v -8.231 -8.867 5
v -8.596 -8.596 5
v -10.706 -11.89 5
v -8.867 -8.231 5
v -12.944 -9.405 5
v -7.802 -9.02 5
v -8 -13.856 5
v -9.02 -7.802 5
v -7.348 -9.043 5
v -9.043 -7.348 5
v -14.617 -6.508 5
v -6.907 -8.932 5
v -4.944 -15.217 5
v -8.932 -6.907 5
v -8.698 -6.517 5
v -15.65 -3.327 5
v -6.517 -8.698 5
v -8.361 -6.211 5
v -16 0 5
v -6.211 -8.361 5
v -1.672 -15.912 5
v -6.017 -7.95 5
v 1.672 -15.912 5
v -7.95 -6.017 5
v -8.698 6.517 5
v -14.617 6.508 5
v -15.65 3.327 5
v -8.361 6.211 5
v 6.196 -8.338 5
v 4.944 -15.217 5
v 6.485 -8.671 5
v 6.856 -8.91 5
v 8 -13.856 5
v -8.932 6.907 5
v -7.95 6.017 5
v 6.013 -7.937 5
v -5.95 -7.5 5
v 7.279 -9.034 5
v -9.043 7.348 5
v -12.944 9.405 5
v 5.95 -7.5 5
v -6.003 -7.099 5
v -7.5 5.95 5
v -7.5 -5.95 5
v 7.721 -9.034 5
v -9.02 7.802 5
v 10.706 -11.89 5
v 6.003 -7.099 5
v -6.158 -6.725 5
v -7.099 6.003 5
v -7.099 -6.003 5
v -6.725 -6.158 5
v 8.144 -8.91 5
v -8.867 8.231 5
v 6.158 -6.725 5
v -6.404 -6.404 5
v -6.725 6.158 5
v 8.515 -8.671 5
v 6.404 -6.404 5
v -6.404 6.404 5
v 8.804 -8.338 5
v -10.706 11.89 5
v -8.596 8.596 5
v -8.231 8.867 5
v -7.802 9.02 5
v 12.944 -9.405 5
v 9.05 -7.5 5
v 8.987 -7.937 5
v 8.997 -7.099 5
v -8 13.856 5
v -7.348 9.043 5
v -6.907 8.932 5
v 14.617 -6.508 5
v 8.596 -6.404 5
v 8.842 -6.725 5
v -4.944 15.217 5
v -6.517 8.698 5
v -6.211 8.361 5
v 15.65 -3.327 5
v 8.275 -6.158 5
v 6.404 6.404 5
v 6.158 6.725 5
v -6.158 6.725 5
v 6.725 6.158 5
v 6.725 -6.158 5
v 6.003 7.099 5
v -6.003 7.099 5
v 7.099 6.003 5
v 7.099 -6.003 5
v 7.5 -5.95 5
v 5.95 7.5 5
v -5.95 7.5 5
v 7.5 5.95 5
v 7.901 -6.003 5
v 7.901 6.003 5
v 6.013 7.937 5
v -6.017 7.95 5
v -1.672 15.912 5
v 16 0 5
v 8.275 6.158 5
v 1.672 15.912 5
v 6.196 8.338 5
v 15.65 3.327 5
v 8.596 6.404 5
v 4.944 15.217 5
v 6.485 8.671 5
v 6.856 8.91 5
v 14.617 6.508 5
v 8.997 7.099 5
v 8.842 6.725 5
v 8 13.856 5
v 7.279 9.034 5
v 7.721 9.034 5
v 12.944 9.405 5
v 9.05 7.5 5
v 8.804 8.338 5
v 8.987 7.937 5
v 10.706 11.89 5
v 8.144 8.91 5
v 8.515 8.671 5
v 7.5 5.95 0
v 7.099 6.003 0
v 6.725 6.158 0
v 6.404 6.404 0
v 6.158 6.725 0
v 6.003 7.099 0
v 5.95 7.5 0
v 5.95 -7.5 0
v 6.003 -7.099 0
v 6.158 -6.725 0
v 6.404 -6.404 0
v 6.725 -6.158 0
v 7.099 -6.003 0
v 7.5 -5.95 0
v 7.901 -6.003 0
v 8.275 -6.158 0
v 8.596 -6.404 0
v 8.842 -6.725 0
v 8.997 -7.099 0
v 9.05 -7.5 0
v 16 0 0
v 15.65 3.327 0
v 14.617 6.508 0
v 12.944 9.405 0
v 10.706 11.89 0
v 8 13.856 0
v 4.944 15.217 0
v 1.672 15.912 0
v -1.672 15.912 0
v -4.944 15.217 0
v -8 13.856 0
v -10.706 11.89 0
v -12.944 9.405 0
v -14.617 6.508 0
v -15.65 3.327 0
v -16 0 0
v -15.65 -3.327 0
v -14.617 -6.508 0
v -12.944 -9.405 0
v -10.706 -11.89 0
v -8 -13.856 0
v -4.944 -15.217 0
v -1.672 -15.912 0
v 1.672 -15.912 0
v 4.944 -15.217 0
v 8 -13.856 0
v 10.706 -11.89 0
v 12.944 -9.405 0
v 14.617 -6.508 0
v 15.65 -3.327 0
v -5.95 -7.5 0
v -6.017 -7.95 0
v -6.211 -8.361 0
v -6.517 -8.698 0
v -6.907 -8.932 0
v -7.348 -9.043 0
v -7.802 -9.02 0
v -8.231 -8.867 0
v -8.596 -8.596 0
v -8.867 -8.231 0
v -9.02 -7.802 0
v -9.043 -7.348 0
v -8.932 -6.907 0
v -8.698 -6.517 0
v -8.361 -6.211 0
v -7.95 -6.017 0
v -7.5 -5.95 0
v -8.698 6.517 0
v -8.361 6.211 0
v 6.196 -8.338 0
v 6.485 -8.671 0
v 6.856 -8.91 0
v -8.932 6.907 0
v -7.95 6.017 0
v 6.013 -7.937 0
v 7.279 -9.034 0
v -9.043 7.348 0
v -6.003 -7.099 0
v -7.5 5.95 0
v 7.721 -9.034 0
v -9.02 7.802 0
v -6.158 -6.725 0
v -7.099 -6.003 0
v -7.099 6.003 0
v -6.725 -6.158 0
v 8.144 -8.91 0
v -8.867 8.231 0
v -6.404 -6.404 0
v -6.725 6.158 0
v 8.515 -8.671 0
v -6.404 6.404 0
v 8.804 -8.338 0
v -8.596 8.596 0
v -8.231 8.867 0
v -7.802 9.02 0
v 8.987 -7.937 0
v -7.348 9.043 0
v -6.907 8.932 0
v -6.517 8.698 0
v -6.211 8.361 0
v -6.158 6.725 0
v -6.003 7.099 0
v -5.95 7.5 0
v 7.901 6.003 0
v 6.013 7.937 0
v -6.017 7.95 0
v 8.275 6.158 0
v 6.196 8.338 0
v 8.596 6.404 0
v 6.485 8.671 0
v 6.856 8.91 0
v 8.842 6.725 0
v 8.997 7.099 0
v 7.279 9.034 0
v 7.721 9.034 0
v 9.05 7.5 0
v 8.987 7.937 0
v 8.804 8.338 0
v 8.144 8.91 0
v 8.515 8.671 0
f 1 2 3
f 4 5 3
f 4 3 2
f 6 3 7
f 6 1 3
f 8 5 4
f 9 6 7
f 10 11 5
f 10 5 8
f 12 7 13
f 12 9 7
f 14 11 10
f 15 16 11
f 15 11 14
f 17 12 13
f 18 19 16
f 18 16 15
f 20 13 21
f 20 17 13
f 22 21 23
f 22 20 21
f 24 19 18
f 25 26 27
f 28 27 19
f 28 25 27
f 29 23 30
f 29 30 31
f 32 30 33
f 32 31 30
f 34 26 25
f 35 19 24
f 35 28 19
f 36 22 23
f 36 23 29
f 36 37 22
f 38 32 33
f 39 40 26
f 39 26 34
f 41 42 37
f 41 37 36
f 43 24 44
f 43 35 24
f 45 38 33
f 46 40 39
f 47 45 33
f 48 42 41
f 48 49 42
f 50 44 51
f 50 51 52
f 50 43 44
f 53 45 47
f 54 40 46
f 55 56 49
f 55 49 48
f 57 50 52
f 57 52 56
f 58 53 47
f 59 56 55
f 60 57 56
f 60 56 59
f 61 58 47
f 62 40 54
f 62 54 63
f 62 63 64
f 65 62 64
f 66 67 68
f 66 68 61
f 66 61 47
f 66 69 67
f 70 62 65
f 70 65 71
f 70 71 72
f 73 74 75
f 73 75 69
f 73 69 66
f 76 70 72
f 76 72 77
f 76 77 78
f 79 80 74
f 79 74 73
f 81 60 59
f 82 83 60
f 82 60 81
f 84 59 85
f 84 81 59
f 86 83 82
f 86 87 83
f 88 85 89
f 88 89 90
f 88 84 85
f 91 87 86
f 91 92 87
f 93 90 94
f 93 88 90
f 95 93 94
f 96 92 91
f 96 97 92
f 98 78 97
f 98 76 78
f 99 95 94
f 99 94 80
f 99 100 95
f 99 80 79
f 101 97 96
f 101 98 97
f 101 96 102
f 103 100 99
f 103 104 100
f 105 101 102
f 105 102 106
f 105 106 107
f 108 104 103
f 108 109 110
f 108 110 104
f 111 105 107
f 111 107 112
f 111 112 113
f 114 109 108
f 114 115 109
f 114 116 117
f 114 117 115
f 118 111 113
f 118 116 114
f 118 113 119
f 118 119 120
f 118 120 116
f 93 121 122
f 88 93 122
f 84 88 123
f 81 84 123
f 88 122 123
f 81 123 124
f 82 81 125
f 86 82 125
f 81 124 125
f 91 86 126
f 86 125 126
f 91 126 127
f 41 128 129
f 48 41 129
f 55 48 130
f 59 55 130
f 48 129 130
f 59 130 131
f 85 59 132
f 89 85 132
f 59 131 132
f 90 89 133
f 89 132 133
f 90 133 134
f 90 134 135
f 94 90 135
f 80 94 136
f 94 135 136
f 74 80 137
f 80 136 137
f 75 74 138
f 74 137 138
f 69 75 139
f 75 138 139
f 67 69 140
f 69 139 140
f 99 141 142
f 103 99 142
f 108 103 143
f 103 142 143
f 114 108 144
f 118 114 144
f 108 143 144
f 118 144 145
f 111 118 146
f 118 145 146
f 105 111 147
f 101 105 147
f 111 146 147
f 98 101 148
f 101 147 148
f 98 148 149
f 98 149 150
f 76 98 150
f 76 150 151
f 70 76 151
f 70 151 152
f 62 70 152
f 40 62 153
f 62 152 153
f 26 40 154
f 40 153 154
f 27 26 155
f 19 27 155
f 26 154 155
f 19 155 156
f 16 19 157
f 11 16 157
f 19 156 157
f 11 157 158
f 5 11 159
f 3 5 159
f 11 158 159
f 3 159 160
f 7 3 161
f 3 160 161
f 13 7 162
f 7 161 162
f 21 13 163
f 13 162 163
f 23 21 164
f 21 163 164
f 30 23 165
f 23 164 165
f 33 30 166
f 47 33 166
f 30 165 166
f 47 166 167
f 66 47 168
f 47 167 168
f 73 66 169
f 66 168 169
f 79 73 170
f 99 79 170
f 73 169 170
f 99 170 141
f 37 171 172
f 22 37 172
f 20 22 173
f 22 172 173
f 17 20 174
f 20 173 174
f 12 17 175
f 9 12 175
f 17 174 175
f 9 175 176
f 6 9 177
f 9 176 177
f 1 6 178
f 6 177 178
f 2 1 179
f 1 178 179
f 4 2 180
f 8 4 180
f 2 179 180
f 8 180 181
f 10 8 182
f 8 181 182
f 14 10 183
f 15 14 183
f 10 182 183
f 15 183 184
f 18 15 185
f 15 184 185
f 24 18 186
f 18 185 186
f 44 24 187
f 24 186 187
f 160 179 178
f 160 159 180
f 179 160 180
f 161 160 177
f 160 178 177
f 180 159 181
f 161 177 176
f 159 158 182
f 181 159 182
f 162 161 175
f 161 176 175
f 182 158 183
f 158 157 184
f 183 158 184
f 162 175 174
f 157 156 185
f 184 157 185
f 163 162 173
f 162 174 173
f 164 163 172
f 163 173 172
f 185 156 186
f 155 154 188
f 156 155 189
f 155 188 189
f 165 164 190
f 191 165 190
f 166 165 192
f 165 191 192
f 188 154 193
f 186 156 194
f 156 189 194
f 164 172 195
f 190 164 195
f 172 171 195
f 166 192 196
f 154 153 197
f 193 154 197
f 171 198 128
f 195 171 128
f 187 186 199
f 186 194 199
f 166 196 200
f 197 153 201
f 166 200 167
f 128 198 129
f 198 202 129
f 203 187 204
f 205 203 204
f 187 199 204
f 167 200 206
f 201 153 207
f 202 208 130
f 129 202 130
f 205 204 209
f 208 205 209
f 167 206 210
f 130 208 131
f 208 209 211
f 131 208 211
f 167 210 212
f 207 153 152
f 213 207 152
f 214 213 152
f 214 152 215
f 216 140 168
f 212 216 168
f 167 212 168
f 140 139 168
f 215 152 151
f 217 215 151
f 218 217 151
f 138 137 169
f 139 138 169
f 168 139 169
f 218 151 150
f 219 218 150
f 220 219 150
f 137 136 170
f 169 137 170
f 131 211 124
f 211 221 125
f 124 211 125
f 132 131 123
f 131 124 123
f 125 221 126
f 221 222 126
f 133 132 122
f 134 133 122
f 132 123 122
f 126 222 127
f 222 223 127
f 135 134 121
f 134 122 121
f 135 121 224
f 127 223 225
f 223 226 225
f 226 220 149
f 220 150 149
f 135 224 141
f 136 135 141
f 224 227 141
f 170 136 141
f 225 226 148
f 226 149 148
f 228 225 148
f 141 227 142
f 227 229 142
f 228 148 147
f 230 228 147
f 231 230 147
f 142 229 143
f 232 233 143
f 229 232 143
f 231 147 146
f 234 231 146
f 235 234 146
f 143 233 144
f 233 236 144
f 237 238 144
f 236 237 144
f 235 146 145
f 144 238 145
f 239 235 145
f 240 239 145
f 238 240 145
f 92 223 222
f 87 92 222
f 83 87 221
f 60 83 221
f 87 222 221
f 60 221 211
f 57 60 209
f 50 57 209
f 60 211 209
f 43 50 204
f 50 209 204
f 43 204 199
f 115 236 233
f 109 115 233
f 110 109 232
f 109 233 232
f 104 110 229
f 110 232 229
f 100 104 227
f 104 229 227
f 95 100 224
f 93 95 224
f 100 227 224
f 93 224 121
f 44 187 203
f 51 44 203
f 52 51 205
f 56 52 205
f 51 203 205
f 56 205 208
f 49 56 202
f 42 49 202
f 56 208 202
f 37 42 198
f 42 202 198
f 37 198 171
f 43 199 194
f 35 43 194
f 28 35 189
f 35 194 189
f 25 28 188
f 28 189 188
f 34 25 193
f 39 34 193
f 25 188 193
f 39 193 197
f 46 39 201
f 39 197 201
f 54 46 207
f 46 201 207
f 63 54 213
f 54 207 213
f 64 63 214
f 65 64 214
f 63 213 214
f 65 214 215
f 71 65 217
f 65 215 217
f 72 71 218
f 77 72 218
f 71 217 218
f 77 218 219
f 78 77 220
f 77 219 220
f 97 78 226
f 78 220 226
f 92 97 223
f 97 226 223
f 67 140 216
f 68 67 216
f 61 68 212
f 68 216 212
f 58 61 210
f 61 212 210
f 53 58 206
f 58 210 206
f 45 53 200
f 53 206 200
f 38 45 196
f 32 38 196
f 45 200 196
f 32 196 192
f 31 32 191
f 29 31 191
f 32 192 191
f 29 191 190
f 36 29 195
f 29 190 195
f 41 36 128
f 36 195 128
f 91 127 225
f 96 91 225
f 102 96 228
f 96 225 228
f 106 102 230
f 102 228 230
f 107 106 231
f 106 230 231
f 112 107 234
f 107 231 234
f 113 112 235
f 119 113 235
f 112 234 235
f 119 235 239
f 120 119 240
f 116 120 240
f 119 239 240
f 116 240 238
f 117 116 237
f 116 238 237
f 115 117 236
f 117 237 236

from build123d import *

# Parameters (mm, degrees)
F0_R     = 16
F1_DEPTH = 5


with BuildPart() as f1:
    # F0 (on Top) → F1 (new body)
    with BuildSketch(Plane.XY):
        Circle(F0_R)
        with BuildLine():
            Line((5.95, -7.5), (-5.95, -7.5))
            ThreePointArc((-5.95, -7.5), (-8.5960155108, -8.5960155108), (-7.5, -5.95))
            Line((-7.5, -5.95), (-7.5, 5.95))
            ThreePointArc((-7.5, 5.95), (-8.5960155108, 8.5960155108), (-5.95, 7.5))
            Line((-5.95, 7.5), (5.95, 7.5))
            ThreePointArc((5.95, 7.5), (7.5, 9.05), (9.05, 7.5))
            ThreePointArc((9.05, 7.5), (8.5960155108, 6.4039844892), (7.5, 5.95))
            Line((7.5, 5.95), (7.5, -5.95))
            ThreePointArc((7.5, -5.95), (8.5960155108, -6.4039844892), (9.05, -7.5))
            ThreePointArc((9.05, -7.5), (7.5, -9.05), (5.95, -7.5))
        make_face(mode=Mode.SUBTRACT)
        with BuildLine():
            ThreePointArc((-7.5, -5.95), (-6.4039844892, -6.4039844892), (-5.95, -7.5))
            Line((-5.95, -7.5), (5.95, -7.5))
            ThreePointArc((5.95, -7.5), (6.4039844892, -6.4039844892), (7.5, -5.95))
            Line((7.5, -5.95), (7.5, 5.95))
            ThreePointArc((7.5, 5.95), (6.4039844892, 6.4039844892), (5.95, 7.5))
            Line((5.95, 7.5), (-5.95, 7.5))
            ThreePointArc((-5.95, 7.5), (-6.4039844892, 6.4039844892), (-7.5, 5.95))
            Line((-7.5, 5.95), (-7.5, -5.95))
        make_face()
    extrude(amount=F1_DEPTH)


solid = f1.part
